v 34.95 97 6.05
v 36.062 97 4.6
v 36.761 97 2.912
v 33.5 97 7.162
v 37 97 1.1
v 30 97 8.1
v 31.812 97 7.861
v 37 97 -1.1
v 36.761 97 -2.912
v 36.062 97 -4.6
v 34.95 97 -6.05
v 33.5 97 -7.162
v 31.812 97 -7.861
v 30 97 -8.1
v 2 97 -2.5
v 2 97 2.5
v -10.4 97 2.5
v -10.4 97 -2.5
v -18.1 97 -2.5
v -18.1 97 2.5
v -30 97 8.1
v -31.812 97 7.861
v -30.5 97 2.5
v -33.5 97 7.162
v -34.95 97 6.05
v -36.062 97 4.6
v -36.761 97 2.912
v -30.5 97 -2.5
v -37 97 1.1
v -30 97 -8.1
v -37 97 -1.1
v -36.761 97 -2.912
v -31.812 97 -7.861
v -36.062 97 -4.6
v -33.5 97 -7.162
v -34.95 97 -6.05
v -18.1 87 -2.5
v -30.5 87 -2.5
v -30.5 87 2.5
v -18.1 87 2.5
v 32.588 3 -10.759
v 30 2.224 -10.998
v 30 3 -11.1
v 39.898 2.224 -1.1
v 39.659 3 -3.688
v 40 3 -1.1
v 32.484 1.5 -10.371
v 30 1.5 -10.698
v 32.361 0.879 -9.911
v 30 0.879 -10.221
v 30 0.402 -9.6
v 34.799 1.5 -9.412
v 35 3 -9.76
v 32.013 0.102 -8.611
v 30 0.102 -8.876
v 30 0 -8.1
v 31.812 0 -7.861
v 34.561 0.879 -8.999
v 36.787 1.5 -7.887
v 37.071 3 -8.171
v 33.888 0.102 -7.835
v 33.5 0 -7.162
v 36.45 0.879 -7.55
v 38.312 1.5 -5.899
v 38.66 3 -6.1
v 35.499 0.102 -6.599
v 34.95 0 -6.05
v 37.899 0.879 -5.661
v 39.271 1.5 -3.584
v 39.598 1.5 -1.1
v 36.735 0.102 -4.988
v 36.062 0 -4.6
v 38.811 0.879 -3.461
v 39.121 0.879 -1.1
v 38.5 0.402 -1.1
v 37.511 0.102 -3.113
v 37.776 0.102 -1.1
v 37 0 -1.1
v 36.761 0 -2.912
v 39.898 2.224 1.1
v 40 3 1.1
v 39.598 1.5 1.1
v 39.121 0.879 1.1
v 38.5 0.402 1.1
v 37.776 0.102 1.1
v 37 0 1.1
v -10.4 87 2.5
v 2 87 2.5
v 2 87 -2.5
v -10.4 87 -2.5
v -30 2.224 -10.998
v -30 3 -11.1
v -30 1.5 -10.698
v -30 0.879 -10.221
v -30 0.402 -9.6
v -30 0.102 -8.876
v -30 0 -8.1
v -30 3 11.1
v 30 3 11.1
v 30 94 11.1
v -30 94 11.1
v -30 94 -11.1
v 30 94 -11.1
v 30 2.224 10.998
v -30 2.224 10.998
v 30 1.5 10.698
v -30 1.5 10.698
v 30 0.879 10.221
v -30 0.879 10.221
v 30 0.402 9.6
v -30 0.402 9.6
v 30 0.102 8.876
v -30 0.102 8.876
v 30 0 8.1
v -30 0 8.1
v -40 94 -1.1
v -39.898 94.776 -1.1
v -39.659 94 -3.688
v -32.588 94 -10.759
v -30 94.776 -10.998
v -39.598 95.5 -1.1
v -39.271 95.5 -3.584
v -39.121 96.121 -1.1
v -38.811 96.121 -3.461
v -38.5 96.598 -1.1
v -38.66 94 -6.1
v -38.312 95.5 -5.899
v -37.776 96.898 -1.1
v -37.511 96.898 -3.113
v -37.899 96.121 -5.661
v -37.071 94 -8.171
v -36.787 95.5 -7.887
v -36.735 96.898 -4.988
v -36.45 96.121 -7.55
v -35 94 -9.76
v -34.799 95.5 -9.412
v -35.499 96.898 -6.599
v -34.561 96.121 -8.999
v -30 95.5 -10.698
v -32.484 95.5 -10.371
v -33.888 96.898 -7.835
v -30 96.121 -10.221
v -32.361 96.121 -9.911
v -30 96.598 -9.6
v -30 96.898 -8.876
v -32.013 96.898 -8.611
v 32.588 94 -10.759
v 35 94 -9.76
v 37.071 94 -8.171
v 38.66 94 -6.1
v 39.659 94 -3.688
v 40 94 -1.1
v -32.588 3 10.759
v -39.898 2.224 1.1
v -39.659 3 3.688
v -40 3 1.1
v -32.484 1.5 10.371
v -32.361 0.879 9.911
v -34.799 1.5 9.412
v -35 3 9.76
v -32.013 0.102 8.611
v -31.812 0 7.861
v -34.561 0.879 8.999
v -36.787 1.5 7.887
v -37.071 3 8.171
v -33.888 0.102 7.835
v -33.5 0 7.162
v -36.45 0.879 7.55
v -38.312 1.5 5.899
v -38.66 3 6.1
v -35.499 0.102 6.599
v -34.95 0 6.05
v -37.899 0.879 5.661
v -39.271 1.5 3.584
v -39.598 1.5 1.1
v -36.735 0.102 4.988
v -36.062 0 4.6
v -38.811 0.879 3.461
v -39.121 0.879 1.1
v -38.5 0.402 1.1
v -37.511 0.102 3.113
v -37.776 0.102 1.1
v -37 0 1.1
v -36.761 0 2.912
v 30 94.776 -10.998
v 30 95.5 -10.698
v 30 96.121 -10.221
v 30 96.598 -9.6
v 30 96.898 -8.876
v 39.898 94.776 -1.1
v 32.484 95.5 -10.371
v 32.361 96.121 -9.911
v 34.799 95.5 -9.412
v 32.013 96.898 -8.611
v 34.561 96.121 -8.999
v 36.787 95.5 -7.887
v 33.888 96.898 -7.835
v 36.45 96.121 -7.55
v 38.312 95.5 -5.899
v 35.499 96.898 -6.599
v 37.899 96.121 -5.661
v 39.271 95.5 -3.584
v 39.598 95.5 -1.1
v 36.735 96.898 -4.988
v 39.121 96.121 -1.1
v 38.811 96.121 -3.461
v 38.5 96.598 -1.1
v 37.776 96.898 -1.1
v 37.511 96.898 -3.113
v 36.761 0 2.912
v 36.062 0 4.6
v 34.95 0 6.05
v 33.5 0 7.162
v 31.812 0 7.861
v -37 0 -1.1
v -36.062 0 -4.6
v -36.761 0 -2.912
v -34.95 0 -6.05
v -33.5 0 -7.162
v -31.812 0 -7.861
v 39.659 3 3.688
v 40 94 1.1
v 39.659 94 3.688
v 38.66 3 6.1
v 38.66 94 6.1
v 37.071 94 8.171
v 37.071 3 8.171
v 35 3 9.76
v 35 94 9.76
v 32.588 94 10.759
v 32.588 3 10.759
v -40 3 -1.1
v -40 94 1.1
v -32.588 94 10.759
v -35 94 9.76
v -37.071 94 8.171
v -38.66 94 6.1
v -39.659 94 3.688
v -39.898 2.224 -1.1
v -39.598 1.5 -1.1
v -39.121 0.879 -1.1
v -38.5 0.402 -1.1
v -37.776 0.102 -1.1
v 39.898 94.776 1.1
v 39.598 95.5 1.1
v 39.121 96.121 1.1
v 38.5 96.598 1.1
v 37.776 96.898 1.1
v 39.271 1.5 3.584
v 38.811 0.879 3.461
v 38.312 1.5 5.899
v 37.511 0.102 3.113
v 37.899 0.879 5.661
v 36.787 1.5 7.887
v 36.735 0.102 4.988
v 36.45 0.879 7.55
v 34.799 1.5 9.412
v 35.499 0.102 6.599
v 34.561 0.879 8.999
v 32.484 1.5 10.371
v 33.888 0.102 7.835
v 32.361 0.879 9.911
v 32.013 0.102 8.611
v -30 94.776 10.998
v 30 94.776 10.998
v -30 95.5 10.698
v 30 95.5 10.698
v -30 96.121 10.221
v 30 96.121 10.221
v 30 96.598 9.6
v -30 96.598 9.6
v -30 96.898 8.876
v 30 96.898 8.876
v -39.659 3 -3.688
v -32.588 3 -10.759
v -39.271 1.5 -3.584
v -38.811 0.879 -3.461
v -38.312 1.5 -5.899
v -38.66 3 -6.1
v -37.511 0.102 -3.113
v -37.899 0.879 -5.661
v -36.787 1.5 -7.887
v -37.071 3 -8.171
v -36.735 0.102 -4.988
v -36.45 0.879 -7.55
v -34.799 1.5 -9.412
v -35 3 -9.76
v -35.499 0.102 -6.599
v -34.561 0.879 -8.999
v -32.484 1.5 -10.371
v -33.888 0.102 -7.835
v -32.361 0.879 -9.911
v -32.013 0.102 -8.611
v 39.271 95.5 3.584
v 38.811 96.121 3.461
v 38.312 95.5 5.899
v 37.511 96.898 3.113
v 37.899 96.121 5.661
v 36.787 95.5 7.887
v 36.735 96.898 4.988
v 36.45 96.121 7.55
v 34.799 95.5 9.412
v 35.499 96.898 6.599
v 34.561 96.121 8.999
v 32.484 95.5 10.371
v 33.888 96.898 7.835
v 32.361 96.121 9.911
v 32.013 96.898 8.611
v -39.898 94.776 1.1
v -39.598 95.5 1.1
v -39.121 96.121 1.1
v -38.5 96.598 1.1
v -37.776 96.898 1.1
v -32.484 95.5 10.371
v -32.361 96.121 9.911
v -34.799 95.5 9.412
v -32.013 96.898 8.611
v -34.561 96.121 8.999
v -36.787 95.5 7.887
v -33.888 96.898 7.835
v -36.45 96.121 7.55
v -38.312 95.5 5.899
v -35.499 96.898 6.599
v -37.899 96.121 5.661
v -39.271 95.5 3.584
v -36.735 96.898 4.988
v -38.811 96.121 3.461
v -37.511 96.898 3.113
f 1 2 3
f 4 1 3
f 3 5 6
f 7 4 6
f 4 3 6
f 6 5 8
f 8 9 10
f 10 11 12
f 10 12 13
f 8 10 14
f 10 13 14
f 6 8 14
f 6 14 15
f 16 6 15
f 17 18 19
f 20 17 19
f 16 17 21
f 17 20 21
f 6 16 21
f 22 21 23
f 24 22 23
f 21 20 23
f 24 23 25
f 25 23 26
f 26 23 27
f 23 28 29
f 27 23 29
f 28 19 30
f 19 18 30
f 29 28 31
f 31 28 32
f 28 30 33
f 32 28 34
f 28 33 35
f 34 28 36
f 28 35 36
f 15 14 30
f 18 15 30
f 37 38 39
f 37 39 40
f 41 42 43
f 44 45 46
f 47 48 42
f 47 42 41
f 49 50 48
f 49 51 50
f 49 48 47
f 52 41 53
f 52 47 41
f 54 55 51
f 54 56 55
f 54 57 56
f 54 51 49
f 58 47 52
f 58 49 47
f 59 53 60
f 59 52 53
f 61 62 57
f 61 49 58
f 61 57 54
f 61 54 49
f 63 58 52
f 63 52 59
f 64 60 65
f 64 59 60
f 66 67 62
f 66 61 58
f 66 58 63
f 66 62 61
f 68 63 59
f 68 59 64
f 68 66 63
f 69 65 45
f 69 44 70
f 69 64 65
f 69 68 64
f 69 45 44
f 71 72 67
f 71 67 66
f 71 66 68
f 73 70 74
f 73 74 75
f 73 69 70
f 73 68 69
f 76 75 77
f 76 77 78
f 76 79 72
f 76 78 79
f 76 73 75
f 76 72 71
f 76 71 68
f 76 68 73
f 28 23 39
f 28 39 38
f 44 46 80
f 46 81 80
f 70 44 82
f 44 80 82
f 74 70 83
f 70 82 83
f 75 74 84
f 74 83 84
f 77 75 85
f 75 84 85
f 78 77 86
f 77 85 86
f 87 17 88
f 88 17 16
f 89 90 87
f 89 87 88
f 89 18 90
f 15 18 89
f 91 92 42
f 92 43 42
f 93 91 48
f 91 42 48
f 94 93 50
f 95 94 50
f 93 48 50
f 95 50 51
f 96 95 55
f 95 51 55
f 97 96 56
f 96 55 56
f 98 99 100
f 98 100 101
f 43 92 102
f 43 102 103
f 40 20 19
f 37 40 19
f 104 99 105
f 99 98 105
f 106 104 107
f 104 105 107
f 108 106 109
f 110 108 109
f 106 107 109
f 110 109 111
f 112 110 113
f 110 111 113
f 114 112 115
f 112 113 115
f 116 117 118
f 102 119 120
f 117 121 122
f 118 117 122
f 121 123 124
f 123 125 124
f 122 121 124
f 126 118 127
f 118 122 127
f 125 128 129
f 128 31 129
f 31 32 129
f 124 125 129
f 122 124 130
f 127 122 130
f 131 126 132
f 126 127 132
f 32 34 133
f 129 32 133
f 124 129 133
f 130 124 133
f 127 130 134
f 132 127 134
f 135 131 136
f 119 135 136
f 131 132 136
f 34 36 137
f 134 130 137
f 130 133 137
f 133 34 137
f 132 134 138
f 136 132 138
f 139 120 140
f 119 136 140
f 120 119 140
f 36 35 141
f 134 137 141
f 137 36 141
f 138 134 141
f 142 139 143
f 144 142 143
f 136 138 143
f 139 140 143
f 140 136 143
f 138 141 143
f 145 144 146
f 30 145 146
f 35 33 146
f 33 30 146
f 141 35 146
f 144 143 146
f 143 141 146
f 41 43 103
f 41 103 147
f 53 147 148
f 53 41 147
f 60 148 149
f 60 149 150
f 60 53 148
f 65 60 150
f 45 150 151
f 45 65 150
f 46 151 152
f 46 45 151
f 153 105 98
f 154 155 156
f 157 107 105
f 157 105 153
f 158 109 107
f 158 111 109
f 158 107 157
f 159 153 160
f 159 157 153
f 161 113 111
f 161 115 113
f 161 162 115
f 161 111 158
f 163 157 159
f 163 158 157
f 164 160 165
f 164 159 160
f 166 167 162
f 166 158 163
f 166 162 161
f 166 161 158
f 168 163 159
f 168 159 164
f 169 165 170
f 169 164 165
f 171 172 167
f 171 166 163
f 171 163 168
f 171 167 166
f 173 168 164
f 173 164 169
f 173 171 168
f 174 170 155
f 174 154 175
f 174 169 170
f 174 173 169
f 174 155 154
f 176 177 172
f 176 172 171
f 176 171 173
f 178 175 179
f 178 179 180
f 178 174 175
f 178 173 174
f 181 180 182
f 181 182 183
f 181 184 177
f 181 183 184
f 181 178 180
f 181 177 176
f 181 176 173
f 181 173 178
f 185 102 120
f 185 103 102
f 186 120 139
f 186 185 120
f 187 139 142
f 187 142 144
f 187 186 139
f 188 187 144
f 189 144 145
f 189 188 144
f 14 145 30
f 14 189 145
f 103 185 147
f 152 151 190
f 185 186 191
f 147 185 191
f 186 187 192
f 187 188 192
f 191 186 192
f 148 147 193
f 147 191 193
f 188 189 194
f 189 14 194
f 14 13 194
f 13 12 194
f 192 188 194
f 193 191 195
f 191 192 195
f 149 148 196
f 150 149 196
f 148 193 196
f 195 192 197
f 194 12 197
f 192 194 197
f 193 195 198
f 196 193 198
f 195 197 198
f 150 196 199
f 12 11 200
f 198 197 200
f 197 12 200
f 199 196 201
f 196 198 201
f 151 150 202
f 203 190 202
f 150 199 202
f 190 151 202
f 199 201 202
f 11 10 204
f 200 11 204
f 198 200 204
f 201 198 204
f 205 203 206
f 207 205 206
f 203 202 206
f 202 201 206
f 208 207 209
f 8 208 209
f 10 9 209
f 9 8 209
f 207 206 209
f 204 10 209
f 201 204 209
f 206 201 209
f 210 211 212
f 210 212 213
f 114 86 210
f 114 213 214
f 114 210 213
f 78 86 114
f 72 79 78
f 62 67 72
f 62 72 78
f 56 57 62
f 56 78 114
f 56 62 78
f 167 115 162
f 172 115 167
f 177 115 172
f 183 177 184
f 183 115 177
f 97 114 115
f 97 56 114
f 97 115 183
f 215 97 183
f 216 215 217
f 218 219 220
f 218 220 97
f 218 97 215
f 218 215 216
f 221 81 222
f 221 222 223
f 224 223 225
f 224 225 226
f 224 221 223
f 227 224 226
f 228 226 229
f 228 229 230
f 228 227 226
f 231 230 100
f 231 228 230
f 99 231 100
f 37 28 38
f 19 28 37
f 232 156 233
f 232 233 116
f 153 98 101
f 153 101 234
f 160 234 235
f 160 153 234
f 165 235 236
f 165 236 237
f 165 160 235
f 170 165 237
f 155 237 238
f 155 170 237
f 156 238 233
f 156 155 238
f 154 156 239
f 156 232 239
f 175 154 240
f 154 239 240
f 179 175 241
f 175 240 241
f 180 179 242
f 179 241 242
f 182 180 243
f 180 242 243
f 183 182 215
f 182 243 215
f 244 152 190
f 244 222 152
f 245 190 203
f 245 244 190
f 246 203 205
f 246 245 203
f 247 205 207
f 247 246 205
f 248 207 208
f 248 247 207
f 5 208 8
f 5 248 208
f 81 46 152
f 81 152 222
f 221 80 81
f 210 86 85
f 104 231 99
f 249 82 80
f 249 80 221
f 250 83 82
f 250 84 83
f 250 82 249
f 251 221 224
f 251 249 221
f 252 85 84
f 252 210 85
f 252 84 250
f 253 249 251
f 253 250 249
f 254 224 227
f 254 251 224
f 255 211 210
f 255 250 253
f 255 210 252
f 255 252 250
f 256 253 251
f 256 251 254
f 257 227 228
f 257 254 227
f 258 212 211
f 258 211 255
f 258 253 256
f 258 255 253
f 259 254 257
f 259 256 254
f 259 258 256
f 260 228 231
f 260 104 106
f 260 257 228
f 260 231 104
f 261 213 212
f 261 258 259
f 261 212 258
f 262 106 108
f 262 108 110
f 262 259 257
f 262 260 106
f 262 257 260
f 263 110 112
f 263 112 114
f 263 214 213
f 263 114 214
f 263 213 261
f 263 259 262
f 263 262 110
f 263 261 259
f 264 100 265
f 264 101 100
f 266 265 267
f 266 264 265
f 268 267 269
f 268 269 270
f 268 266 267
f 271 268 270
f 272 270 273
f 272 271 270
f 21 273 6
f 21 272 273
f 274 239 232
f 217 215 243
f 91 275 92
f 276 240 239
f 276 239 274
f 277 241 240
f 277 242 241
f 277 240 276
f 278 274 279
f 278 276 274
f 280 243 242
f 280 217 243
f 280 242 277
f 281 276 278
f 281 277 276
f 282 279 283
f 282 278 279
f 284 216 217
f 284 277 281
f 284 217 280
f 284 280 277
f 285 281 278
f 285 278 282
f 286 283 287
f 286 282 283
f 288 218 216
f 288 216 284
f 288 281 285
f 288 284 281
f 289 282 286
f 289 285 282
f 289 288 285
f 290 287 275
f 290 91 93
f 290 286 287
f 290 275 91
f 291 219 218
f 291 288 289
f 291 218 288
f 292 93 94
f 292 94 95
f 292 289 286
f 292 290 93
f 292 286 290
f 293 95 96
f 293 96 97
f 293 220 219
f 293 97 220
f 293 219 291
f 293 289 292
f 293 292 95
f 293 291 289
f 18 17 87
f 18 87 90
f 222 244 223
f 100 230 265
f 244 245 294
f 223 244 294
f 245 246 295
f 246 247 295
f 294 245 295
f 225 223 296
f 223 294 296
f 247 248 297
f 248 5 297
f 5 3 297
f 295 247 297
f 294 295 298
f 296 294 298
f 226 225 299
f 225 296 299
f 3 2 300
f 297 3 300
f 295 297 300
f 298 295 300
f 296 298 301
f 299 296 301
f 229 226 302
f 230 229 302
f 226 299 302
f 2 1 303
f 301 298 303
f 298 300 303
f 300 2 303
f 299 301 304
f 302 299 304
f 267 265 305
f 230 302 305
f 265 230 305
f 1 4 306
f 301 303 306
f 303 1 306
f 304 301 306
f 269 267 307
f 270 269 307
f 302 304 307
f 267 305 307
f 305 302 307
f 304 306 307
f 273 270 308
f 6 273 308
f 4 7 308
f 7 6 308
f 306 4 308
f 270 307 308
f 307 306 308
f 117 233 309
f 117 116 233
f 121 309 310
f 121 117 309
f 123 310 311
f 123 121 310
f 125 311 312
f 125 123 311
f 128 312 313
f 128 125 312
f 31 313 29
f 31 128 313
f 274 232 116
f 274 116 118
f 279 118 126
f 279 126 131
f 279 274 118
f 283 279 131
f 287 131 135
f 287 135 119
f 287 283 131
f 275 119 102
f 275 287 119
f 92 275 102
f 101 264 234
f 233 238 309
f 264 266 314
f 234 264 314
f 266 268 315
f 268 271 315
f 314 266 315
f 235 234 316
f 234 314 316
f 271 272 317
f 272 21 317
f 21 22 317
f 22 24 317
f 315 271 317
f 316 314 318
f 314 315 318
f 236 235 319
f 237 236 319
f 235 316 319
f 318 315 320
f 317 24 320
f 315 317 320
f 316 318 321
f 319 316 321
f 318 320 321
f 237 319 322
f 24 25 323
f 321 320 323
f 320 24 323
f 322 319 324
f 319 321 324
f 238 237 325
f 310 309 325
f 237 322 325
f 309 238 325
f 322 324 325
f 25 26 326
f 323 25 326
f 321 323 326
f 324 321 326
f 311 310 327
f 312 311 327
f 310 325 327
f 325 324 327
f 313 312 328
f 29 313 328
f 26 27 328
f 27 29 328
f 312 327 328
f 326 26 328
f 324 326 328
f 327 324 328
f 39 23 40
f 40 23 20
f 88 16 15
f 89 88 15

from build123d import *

# Parameters (mm, degrees)
BOSS_EXTRUDE1_DEPTH = 97
FILLET1_R           = 3
SKETCH2_W           = 12.4
SKETCH2_H           = 5
CUT_EXTRUDE1_DEPTH  = 10


with BuildPart() as part:
    # Sketch1 → Boss-Extrude1 (new body)
    with BuildSketch(Plane(origin=(0, 0, 0), x_dir=(1, 0, 0), z_dir=(0, 1, 0))):
        with BuildLine():
            Line((-30, 11.1), (30, 11.1))
            ThreePointArc((30, 11.1), (37.071067812, 8.171067812), (40, 1.1))
            Line((40, 1.1), (40, -1.1))
            ThreePointArc((40, -1.1), (37.071067812, -8.171067812), (30, -11.1))
            Line((30, -11.1), (-30, -11.1))
            ThreePointArc((-30, -11.1), (-37.071067812, -8.171067812), (-40, -1.1))
            Line((-40, -1.1), (-40, 1.1))
            ThreePointArc((-40, 1.1), (-37.071067812, 8.171067812), (-30, 11.1))
        make_face()
    extrude(amount=BOSS_EXTRUDE1_DEPTH)

    # Fillet1
    fillet1_edges = [part.edges().sort_by_distance(p)[0] for p in [
        (37.071067812, 97, -8.171067812),
        (40, 0, 0),
        (37.071067812, 0, 8.171067812),
        (0, 97, -11.1),
        (-37.071067812, 97, -8.171067812),
        (-40, 97, 0),
        (-37.071067812, 97, 8.171067812),
        (0, 97, 11.1),
        (37.071067812, 97, 8.171067812),
        (40, 97, 0),
        (0, 0, 11.1),
        (-37.071067812, 0, 8.171067812),
        (-40, 0, 0),
        (-37.071067812, 0, -8.171067812),
        (0, 0, -11.1),
        (37.071067812, 0, -8.171067812),
    ]]
    fillet(fillet1_edges, radius=FILLET1_R)

    # Sketch2 → Cut-Extrude1 (cut)
    with BuildSketch(Plane(origin=(0, 97, 0), x_dir=(1, 0, 0), z_dir=(0, 1, 0))):
        with Locations((-24.3, 0)):
            Rectangle(SKETCH2_W, SKETCH2_H)
        with Locations((-4.2, 0)):
            Rectangle(SKETCH2_W, SKETCH2_H)
    extrude(amount=-CUT_EXTRUDE1_DEPTH, mode=Mode.SUBTRACT)


solid = part.part
